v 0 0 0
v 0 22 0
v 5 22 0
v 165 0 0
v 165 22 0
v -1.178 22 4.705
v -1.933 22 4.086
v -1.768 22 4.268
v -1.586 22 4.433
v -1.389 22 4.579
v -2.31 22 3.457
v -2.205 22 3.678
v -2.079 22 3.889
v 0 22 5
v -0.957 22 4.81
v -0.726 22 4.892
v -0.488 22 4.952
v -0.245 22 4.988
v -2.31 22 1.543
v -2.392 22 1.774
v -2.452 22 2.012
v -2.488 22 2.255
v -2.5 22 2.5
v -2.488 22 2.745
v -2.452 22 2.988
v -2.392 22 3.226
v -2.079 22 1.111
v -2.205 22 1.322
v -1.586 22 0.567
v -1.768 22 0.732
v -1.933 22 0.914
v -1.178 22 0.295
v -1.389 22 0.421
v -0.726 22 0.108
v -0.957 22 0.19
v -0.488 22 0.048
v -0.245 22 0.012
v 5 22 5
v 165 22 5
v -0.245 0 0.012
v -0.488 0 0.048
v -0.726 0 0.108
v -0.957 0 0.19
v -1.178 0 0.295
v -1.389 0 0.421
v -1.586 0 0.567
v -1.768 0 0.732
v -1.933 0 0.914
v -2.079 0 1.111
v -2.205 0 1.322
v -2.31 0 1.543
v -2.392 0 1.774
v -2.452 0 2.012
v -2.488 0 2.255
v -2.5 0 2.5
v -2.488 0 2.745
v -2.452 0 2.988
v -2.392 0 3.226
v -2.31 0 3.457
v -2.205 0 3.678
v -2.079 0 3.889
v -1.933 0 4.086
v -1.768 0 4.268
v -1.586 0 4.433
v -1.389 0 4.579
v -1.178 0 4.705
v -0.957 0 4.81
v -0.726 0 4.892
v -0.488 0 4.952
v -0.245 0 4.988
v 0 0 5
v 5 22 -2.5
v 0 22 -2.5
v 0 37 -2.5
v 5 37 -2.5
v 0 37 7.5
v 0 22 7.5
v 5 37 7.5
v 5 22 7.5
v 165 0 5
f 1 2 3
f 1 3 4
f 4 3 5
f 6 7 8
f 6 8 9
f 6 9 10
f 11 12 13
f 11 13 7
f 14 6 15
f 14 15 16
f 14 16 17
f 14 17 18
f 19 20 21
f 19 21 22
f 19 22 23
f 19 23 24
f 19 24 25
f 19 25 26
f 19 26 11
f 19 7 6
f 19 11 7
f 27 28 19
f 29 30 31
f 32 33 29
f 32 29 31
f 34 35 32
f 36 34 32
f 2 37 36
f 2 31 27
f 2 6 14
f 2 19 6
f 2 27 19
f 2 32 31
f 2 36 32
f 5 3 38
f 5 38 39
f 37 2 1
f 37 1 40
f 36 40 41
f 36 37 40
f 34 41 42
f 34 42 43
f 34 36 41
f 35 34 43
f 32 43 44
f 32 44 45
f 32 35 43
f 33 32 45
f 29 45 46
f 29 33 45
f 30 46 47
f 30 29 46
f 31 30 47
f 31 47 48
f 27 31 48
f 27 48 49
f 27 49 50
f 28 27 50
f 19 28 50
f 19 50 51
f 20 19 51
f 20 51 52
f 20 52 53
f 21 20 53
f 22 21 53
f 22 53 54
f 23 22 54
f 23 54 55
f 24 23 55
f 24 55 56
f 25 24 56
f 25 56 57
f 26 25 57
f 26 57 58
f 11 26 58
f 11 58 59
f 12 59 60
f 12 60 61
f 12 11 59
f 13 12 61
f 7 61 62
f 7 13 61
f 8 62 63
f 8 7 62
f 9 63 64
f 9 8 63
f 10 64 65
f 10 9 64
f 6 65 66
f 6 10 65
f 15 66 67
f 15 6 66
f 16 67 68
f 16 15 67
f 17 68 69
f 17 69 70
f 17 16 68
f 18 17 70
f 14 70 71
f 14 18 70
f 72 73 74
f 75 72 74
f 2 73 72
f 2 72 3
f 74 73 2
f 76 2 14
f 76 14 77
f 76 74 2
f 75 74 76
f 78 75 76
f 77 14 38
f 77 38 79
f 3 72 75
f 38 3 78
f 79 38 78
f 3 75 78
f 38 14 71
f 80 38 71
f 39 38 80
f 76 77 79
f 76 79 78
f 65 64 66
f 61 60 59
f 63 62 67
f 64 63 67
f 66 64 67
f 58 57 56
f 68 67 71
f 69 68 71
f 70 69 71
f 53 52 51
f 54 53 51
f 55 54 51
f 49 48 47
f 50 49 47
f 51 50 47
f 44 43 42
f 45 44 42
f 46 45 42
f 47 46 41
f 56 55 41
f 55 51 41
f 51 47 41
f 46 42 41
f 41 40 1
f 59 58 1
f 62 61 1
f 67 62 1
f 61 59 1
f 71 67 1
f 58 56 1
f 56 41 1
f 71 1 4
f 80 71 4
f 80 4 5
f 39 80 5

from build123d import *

# Parameters (mm, degrees)
SKETCH1_W           = 165
SKETCH1_H           = 22
BOSS_EXTRUDE1_DEPTH = 5
SKETCH2_W           = 10
SKETCH2_H           = 15
BOSS_EXTRUDE2_DEPTH = 5
SKETCH3_R           = 2.5
BOSS_EXTRUDE3_DEPTH = 22


with BuildPart() as part:
    # Sketch1 → Boss-Extrude1 (new body)
    with BuildSketch(Plane.XY):
        with Locations((82.5, 11)):
            Rectangle(SKETCH1_W, SKETCH1_H)
    extrude(amount=BOSS_EXTRUDE1_DEPTH)

    # Sketch2 → Boss-Extrude2 (add)
    with BuildSketch(Plane.ZY):
        with Locations((2.5, 29.5)):
            Rectangle(SKETCH2_W, SKETCH2_H)
    extrude(amount=-BOSS_EXTRUDE2_DEPTH)

    # Sketch3 → Boss-Extrude3 (add)
    with BuildSketch(Plane(origin=(0, 22, 0), x_dir=(1, 0, 0), z_dir=(0, 1, 0))):
        with Locations((0, -2.5)):
            Circle(SKETCH3_R)
    extrude(amount=-BOSS_EXTRUDE3_DEPTH)


solid = part.part
